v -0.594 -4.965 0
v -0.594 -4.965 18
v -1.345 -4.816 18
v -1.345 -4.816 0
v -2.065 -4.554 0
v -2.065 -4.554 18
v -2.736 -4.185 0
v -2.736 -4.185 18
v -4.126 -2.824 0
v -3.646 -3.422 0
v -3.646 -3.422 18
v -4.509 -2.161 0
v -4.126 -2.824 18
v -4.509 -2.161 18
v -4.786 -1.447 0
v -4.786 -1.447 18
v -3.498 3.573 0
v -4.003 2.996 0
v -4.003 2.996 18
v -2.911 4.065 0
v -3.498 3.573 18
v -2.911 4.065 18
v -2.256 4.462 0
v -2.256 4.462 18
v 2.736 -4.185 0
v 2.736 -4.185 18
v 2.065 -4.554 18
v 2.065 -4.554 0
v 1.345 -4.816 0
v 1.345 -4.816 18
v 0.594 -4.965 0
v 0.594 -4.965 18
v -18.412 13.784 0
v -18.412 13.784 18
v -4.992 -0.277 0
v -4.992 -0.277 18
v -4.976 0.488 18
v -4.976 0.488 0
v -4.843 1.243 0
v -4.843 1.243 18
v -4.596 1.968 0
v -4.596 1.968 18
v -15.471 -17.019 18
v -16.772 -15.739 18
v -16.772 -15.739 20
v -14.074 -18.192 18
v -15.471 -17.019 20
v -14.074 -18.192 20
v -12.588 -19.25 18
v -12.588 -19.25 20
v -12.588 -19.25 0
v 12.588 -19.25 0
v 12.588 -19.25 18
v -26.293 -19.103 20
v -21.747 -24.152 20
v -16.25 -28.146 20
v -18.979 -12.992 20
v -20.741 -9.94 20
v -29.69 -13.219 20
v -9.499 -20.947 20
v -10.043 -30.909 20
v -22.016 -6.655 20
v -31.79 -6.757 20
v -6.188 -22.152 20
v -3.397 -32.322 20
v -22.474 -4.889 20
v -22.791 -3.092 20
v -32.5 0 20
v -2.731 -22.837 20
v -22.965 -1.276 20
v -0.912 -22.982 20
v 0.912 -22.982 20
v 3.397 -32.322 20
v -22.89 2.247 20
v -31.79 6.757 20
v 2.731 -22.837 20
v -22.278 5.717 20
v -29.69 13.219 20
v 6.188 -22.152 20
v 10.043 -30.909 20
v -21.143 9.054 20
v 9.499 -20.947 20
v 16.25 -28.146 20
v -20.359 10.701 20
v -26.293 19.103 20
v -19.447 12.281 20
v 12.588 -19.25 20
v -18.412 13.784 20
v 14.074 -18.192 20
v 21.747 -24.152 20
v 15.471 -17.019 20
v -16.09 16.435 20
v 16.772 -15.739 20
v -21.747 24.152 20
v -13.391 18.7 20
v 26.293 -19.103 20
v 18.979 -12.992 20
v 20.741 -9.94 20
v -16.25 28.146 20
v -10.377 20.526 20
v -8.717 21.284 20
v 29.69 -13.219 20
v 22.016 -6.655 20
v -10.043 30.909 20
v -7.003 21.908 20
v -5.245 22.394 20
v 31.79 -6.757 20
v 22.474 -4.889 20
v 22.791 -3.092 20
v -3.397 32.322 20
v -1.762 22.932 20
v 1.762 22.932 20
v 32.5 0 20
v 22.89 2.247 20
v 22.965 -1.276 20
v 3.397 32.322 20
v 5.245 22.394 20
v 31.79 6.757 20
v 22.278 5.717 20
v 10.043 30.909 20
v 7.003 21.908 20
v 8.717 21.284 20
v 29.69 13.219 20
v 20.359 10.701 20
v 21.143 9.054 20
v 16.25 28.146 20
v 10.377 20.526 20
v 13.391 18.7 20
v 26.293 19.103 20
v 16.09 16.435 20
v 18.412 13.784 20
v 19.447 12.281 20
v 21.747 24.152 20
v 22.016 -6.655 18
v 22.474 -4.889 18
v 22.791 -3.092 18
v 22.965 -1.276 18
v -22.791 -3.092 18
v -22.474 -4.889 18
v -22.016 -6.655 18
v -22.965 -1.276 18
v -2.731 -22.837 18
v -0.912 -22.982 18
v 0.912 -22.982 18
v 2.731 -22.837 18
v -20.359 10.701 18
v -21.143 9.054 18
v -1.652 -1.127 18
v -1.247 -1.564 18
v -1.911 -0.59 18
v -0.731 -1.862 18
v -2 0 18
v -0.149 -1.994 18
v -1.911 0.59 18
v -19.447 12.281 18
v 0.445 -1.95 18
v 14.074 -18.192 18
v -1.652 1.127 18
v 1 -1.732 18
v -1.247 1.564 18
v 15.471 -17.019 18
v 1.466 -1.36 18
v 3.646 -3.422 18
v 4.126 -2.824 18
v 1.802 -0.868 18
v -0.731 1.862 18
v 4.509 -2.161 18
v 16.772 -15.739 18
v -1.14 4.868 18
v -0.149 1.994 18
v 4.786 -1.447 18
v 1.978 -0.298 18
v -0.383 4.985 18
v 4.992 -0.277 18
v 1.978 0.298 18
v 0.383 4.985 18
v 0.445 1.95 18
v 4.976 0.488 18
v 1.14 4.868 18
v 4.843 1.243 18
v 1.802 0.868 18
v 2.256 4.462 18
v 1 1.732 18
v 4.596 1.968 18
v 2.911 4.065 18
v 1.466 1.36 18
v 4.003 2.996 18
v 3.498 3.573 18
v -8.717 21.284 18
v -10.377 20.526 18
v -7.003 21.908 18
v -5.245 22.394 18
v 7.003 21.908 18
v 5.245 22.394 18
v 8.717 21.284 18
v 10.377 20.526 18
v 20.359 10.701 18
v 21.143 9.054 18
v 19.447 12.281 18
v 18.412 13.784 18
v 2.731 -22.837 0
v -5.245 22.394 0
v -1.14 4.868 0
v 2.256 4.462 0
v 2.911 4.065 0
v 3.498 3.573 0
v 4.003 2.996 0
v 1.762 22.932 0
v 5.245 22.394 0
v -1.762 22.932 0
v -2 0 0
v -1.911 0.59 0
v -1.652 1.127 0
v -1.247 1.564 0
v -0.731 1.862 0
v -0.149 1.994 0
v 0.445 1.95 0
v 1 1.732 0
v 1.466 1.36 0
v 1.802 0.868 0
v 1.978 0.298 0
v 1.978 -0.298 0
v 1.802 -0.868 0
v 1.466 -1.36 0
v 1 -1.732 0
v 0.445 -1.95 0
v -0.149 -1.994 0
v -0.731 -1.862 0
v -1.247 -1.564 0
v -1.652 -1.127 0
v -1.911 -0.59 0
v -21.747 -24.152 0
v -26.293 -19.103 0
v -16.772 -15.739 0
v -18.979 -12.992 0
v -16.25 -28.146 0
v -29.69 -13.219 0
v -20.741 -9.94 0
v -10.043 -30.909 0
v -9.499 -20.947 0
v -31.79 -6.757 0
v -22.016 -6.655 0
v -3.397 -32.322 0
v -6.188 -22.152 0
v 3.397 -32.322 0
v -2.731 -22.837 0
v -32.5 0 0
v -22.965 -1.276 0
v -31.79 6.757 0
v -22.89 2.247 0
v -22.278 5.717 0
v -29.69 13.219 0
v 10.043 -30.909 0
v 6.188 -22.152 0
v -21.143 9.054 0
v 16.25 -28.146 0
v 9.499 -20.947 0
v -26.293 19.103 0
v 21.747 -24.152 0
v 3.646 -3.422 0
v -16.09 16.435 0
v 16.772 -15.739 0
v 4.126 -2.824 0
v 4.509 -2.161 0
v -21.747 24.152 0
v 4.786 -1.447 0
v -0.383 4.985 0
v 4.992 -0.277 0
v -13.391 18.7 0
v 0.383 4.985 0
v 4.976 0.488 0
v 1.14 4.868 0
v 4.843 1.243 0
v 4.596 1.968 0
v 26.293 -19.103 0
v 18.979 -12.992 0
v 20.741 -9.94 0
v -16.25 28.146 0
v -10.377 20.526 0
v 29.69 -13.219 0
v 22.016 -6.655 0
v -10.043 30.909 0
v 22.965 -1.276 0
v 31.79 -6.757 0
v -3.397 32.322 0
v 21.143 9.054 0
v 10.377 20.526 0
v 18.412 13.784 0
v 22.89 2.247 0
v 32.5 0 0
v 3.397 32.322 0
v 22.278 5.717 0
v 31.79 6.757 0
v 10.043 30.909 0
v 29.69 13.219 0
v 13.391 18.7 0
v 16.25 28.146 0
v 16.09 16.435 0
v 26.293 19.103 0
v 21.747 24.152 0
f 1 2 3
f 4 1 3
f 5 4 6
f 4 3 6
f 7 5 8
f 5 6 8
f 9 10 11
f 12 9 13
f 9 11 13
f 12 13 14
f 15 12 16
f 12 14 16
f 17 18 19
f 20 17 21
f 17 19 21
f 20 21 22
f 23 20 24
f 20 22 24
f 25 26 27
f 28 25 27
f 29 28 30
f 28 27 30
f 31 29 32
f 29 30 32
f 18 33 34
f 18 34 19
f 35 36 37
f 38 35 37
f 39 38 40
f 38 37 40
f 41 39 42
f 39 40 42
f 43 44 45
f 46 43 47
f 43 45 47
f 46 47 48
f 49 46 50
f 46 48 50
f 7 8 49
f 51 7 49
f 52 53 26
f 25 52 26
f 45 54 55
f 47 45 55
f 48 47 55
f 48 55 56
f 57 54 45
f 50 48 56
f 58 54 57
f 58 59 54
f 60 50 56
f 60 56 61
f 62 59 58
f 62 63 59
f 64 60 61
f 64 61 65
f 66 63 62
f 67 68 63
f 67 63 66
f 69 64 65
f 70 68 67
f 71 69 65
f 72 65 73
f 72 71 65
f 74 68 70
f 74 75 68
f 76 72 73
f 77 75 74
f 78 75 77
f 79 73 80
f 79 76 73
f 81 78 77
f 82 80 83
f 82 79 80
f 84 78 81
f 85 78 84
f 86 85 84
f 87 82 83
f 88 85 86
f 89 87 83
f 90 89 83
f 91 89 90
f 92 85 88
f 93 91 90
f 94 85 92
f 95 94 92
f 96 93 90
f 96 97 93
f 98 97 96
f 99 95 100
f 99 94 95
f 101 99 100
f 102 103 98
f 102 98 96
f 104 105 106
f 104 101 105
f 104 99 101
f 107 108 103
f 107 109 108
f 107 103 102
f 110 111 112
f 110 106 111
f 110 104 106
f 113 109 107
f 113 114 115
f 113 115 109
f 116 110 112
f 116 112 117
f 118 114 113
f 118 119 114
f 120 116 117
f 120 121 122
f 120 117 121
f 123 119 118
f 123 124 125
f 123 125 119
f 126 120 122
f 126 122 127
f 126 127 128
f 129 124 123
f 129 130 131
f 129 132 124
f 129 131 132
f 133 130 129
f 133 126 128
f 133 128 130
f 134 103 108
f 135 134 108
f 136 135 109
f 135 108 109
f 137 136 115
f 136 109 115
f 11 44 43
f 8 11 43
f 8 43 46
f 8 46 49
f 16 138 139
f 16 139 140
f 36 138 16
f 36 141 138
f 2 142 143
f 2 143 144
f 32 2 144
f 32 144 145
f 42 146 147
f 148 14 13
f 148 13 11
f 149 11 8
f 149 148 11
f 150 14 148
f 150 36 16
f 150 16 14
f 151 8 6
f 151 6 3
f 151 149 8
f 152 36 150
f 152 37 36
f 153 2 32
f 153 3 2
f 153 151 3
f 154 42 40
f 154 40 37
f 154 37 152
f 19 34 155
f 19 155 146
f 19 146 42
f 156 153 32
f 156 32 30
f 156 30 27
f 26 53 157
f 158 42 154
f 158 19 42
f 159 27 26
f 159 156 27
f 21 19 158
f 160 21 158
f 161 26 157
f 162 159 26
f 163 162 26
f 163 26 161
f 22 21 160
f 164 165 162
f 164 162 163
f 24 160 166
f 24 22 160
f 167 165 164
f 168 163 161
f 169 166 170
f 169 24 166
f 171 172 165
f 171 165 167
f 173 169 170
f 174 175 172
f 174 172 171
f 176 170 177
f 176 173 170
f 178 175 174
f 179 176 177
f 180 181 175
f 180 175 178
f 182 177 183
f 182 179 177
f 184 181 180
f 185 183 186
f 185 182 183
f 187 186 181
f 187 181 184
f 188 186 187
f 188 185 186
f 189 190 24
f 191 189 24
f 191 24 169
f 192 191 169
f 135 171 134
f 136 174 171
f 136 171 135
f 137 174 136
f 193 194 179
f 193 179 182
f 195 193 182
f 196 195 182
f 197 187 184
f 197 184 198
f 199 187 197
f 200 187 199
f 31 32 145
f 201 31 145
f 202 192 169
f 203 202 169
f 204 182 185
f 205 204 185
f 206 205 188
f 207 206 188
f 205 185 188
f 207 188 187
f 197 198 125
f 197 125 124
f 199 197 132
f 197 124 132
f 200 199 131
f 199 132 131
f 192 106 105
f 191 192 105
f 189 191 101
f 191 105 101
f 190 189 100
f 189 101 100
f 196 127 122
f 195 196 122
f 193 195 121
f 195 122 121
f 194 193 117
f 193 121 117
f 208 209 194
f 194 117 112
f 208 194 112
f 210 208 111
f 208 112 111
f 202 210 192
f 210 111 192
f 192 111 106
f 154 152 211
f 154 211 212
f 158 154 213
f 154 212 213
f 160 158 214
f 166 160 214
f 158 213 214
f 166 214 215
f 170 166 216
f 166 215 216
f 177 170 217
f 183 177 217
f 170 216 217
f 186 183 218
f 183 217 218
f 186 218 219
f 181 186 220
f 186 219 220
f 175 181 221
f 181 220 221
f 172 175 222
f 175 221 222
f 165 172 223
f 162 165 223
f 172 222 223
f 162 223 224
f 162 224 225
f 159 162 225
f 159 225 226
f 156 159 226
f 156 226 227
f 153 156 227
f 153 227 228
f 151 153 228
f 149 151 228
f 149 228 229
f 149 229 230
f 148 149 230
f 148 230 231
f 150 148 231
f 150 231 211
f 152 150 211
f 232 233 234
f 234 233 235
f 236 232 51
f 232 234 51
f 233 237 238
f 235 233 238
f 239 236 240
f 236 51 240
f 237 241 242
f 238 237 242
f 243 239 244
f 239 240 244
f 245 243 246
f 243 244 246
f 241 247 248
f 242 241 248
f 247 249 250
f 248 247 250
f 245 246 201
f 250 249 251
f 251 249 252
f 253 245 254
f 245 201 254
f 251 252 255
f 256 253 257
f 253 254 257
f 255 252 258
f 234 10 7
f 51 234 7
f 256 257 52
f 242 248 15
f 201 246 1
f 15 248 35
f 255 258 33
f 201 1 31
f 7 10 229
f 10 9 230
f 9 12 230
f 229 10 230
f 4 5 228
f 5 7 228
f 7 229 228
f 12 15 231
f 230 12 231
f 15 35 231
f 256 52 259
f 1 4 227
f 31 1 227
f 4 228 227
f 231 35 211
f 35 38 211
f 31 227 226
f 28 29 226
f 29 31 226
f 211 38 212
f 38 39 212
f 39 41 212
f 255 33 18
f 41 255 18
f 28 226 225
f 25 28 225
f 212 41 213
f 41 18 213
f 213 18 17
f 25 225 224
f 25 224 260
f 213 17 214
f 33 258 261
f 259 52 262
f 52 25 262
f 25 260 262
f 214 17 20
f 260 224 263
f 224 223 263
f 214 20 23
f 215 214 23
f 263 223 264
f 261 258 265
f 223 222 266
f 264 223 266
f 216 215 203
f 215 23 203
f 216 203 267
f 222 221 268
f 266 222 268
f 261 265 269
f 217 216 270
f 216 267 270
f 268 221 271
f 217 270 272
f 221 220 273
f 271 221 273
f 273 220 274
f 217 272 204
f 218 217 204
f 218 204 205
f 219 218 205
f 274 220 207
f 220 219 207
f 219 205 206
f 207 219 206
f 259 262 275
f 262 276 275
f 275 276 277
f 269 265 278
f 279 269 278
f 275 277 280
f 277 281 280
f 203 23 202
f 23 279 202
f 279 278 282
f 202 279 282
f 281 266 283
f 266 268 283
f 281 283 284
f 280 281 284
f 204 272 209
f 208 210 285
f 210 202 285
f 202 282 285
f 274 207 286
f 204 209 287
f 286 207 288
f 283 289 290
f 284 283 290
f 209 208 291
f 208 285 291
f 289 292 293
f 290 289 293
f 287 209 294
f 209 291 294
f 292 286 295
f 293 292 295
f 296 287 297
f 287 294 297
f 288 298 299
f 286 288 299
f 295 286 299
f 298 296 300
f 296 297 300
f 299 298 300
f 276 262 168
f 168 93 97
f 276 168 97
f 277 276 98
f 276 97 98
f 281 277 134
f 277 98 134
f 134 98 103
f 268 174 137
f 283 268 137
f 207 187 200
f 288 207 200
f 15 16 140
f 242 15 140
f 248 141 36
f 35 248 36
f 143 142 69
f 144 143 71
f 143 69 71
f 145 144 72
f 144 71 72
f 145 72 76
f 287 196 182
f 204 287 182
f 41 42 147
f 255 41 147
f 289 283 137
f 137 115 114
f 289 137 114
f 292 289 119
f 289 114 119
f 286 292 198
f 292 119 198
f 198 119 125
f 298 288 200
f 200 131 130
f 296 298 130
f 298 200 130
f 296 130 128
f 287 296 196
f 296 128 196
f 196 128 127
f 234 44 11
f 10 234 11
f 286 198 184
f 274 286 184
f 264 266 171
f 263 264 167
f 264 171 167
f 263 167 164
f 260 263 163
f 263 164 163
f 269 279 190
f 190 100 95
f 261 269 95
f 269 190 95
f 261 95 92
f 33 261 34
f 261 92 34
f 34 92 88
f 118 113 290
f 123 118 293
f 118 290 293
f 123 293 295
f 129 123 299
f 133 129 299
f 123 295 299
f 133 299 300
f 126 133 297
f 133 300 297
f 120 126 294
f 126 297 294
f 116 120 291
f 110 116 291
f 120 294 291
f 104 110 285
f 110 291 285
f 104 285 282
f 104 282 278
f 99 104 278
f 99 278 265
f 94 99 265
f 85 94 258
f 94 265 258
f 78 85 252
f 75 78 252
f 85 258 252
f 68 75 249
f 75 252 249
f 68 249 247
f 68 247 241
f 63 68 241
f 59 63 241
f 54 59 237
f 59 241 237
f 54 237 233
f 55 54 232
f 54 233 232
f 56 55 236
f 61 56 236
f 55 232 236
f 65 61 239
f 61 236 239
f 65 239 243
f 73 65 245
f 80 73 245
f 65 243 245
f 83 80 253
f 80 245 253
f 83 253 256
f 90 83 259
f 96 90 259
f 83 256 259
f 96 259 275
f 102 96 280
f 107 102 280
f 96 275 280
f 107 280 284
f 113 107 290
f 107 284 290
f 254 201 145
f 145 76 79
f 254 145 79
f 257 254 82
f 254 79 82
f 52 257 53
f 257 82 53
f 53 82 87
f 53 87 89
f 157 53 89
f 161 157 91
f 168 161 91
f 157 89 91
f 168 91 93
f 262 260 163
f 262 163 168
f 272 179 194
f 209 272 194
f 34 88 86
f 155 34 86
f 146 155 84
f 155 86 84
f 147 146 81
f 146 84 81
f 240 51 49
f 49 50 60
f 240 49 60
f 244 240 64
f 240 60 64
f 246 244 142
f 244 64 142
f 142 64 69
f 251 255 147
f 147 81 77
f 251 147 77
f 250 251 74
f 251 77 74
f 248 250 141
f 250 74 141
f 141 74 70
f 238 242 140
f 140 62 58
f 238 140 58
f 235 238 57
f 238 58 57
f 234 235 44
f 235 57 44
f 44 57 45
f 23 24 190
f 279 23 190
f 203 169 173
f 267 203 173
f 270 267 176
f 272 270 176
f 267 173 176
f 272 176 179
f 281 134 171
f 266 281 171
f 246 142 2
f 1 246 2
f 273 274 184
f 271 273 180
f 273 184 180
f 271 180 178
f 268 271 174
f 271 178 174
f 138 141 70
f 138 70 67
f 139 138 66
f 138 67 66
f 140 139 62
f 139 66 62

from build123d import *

# Parameters (mm, degrees)
CROQUIS1_R              = 32.5
SALIENTE_EXTRUIR1_DEPTH = 20
CROQUIS2_R              = 2
CORTAR_EXTRUIR1_DEPTH   = 20
CORTAR_EXTRUIR2_DEPTH   = 20
CROQUIS4_R              = 23
CORTAR_EXTRUIR3_DEPTH   = 2


with BuildPart() as part:
    # Croquis1 → Saliente-Extruir1 (new body)
    with BuildSketch(Plane.XY):
        Circle(CROQUIS1_R)
    extrude(amount=SALIENTE_EXTRUIR1_DEPTH)

    # Croquis2 → Cortar-Extruir1 (cut)
    with BuildSketch(Plane(origin=(0, 0, 0), x_dir=(-1, 0, 0), z_dir=(0, 0, -1))):
        Circle(CROQUIS2_R)
    extrude(amount=-CORTAR_EXTRUIR1_DEPTH, mode=Mode.SUBTRACT)

    # Croquis3 → Cortar-Extruir2 (cut)
    with BuildSketch(Plane.XY.offset(20)):
        with BuildLine():
            Line((1.140137938, 4.868273357), (5.244634516, 22.394057444))
            ThreePointArc((5.244634516, 22.394057444), (0, 23), (-5.244634516, 22.394057444))
            Line((-5.244634516, 22.394057444), (-1.140137938, 4.868273357))
            ThreePointArc((-1.140137938, 4.868273357), (0, 5), (1.140137938, 4.868273357))
        make_face()
        with BuildLine():
            Line((4.002662127, 2.996447213), (18.412245782, 13.78365718))
            ThreePointArc((18.412245782, 13.78365718), (14.784115023, 17.619022192), (10.376999529, 20.526029348))
            Line((10.376999529, 20.526029348), (2.255869463, 4.462180293))
            ThreePointArc((2.255869463, 4.462180293), (3.213938048, 3.830222216), (4.002662127, 2.996447213))
        make_face()
        with BuildLine():
            Line((4.992296221, -0.277449884), (22.964562618, -1.276269467))
            ThreePointArc((22.964562618, -1.276269467), (22.650578319, 3.993908086), (21.143120166, 9.053643998))
            Line((21.143120166, 9.053643998), (4.596330471, 1.968183478))
            ThreePointArc((4.596330471, 1.968183478), (4.924038765, 0.868240888), (4.992296221, -0.277449884))
        make_face()
        with BuildLine():
            Line((3.645979431, -3.421525097), (16.771505382, -15.739015446))
            ThreePointArc((16.771505382, -15.739015446), (19.918584287, -11.5), (22.016139898, -6.655041998))
            Line((22.016139898, -6.655041998), (4.786117369, -1.44674826))
            ThreePointArc((4.786117369, -1.44674826), (4.330127019, -2.5), (3.645979431, -3.421525097))
        make_face()
        with BuildLine():
            Line((0.593668344, -4.964630691), (2.730874383, -22.837301178))
            ThreePointArc((2.730874383, -22.837301178), (7.866463296, -21.612930278), (12.58756309, -19.249759881))
            Line((12.58756309, -19.249759881), (2.736426759, -4.184730409))
            ThreePointArc((2.736426759, -4.184730409), (1.710100717, -4.698463104), (0.593668344, -4.964630691))
        make_face()
        with BuildLine():
            Line((-2.736426759, -4.184730409), (-12.58756309, -19.249759881))
            ThreePointArc((-12.58756309, -19.249759881), (-7.866463296, -21.612930278), (-2.730874383, -22.837301178))
            Line((-2.730874383, -22.837301178), (-0.593668344, -4.964630691))
            ThreePointArc((-0.593668344, -4.964630691), (-1.710100717, -4.698463104), (-2.736426759, -4.184730409))
        make_face()
        with BuildLine():
            Line((-4.786117369, -1.44674826), (-22.016139898, -6.655041998))
            ThreePointArc((-22.016139898, -6.655041998), (-19.918584287, -11.5), (-16.771505382, -15.739015446))
            Line((-16.771505382, -15.739015446), (-3.645979431, -3.421525097))
            ThreePointArc((-3.645979431, -3.421525097), (-4.330127019, -2.5), (-4.786117369, -1.44674826))
        make_face()
        with BuildLine():
            Line((-4.596330471, 1.968183478), (-21.143120166, 9.053643998))
            ThreePointArc((-21.143120166, 9.053643998), (-22.650578319, 3.993908086), (-22.964562618, -1.276269467))
            Line((-22.964562618, -1.276269467), (-4.992296221, -0.277449884))
            ThreePointArc((-4.992296221, -0.277449884), (-4.924038765, 0.868240888), (-4.596330471, 1.968183478))
        make_face()
        with BuildLine():
            Line((-2.255869463, 4.462180293), (-10.376999529, 20.526029348))
            ThreePointArc((-10.376999529, 20.526029348), (-14.784115023, 17.619022192), (-18.412245782, 13.78365718))
            Line((-18.412245782, 13.78365718), (-4.002662127, 2.996447213))
            ThreePointArc((-4.002662127, 2.996447213), (-3.213938048, 3.830222216), (-2.255869463, 4.462180293))
        make_face()
    extrude(amount=-CORTAR_EXTRUIR2_DEPTH, mode=Mode.SUBTRACT)

    # Croquis4 → Cortar-Extruir3 (cut)
    with BuildSketch(Plane.XY.offset(20)):
        with Locations(Location((0, 0, 0), (0, 0, 356.819024652))):
            Circle(CROQUIS4_R)
    extrude(amount=-CORTAR_EXTRUIR3_DEPTH, mode=Mode.SUBTRACT)


solid = part.part
